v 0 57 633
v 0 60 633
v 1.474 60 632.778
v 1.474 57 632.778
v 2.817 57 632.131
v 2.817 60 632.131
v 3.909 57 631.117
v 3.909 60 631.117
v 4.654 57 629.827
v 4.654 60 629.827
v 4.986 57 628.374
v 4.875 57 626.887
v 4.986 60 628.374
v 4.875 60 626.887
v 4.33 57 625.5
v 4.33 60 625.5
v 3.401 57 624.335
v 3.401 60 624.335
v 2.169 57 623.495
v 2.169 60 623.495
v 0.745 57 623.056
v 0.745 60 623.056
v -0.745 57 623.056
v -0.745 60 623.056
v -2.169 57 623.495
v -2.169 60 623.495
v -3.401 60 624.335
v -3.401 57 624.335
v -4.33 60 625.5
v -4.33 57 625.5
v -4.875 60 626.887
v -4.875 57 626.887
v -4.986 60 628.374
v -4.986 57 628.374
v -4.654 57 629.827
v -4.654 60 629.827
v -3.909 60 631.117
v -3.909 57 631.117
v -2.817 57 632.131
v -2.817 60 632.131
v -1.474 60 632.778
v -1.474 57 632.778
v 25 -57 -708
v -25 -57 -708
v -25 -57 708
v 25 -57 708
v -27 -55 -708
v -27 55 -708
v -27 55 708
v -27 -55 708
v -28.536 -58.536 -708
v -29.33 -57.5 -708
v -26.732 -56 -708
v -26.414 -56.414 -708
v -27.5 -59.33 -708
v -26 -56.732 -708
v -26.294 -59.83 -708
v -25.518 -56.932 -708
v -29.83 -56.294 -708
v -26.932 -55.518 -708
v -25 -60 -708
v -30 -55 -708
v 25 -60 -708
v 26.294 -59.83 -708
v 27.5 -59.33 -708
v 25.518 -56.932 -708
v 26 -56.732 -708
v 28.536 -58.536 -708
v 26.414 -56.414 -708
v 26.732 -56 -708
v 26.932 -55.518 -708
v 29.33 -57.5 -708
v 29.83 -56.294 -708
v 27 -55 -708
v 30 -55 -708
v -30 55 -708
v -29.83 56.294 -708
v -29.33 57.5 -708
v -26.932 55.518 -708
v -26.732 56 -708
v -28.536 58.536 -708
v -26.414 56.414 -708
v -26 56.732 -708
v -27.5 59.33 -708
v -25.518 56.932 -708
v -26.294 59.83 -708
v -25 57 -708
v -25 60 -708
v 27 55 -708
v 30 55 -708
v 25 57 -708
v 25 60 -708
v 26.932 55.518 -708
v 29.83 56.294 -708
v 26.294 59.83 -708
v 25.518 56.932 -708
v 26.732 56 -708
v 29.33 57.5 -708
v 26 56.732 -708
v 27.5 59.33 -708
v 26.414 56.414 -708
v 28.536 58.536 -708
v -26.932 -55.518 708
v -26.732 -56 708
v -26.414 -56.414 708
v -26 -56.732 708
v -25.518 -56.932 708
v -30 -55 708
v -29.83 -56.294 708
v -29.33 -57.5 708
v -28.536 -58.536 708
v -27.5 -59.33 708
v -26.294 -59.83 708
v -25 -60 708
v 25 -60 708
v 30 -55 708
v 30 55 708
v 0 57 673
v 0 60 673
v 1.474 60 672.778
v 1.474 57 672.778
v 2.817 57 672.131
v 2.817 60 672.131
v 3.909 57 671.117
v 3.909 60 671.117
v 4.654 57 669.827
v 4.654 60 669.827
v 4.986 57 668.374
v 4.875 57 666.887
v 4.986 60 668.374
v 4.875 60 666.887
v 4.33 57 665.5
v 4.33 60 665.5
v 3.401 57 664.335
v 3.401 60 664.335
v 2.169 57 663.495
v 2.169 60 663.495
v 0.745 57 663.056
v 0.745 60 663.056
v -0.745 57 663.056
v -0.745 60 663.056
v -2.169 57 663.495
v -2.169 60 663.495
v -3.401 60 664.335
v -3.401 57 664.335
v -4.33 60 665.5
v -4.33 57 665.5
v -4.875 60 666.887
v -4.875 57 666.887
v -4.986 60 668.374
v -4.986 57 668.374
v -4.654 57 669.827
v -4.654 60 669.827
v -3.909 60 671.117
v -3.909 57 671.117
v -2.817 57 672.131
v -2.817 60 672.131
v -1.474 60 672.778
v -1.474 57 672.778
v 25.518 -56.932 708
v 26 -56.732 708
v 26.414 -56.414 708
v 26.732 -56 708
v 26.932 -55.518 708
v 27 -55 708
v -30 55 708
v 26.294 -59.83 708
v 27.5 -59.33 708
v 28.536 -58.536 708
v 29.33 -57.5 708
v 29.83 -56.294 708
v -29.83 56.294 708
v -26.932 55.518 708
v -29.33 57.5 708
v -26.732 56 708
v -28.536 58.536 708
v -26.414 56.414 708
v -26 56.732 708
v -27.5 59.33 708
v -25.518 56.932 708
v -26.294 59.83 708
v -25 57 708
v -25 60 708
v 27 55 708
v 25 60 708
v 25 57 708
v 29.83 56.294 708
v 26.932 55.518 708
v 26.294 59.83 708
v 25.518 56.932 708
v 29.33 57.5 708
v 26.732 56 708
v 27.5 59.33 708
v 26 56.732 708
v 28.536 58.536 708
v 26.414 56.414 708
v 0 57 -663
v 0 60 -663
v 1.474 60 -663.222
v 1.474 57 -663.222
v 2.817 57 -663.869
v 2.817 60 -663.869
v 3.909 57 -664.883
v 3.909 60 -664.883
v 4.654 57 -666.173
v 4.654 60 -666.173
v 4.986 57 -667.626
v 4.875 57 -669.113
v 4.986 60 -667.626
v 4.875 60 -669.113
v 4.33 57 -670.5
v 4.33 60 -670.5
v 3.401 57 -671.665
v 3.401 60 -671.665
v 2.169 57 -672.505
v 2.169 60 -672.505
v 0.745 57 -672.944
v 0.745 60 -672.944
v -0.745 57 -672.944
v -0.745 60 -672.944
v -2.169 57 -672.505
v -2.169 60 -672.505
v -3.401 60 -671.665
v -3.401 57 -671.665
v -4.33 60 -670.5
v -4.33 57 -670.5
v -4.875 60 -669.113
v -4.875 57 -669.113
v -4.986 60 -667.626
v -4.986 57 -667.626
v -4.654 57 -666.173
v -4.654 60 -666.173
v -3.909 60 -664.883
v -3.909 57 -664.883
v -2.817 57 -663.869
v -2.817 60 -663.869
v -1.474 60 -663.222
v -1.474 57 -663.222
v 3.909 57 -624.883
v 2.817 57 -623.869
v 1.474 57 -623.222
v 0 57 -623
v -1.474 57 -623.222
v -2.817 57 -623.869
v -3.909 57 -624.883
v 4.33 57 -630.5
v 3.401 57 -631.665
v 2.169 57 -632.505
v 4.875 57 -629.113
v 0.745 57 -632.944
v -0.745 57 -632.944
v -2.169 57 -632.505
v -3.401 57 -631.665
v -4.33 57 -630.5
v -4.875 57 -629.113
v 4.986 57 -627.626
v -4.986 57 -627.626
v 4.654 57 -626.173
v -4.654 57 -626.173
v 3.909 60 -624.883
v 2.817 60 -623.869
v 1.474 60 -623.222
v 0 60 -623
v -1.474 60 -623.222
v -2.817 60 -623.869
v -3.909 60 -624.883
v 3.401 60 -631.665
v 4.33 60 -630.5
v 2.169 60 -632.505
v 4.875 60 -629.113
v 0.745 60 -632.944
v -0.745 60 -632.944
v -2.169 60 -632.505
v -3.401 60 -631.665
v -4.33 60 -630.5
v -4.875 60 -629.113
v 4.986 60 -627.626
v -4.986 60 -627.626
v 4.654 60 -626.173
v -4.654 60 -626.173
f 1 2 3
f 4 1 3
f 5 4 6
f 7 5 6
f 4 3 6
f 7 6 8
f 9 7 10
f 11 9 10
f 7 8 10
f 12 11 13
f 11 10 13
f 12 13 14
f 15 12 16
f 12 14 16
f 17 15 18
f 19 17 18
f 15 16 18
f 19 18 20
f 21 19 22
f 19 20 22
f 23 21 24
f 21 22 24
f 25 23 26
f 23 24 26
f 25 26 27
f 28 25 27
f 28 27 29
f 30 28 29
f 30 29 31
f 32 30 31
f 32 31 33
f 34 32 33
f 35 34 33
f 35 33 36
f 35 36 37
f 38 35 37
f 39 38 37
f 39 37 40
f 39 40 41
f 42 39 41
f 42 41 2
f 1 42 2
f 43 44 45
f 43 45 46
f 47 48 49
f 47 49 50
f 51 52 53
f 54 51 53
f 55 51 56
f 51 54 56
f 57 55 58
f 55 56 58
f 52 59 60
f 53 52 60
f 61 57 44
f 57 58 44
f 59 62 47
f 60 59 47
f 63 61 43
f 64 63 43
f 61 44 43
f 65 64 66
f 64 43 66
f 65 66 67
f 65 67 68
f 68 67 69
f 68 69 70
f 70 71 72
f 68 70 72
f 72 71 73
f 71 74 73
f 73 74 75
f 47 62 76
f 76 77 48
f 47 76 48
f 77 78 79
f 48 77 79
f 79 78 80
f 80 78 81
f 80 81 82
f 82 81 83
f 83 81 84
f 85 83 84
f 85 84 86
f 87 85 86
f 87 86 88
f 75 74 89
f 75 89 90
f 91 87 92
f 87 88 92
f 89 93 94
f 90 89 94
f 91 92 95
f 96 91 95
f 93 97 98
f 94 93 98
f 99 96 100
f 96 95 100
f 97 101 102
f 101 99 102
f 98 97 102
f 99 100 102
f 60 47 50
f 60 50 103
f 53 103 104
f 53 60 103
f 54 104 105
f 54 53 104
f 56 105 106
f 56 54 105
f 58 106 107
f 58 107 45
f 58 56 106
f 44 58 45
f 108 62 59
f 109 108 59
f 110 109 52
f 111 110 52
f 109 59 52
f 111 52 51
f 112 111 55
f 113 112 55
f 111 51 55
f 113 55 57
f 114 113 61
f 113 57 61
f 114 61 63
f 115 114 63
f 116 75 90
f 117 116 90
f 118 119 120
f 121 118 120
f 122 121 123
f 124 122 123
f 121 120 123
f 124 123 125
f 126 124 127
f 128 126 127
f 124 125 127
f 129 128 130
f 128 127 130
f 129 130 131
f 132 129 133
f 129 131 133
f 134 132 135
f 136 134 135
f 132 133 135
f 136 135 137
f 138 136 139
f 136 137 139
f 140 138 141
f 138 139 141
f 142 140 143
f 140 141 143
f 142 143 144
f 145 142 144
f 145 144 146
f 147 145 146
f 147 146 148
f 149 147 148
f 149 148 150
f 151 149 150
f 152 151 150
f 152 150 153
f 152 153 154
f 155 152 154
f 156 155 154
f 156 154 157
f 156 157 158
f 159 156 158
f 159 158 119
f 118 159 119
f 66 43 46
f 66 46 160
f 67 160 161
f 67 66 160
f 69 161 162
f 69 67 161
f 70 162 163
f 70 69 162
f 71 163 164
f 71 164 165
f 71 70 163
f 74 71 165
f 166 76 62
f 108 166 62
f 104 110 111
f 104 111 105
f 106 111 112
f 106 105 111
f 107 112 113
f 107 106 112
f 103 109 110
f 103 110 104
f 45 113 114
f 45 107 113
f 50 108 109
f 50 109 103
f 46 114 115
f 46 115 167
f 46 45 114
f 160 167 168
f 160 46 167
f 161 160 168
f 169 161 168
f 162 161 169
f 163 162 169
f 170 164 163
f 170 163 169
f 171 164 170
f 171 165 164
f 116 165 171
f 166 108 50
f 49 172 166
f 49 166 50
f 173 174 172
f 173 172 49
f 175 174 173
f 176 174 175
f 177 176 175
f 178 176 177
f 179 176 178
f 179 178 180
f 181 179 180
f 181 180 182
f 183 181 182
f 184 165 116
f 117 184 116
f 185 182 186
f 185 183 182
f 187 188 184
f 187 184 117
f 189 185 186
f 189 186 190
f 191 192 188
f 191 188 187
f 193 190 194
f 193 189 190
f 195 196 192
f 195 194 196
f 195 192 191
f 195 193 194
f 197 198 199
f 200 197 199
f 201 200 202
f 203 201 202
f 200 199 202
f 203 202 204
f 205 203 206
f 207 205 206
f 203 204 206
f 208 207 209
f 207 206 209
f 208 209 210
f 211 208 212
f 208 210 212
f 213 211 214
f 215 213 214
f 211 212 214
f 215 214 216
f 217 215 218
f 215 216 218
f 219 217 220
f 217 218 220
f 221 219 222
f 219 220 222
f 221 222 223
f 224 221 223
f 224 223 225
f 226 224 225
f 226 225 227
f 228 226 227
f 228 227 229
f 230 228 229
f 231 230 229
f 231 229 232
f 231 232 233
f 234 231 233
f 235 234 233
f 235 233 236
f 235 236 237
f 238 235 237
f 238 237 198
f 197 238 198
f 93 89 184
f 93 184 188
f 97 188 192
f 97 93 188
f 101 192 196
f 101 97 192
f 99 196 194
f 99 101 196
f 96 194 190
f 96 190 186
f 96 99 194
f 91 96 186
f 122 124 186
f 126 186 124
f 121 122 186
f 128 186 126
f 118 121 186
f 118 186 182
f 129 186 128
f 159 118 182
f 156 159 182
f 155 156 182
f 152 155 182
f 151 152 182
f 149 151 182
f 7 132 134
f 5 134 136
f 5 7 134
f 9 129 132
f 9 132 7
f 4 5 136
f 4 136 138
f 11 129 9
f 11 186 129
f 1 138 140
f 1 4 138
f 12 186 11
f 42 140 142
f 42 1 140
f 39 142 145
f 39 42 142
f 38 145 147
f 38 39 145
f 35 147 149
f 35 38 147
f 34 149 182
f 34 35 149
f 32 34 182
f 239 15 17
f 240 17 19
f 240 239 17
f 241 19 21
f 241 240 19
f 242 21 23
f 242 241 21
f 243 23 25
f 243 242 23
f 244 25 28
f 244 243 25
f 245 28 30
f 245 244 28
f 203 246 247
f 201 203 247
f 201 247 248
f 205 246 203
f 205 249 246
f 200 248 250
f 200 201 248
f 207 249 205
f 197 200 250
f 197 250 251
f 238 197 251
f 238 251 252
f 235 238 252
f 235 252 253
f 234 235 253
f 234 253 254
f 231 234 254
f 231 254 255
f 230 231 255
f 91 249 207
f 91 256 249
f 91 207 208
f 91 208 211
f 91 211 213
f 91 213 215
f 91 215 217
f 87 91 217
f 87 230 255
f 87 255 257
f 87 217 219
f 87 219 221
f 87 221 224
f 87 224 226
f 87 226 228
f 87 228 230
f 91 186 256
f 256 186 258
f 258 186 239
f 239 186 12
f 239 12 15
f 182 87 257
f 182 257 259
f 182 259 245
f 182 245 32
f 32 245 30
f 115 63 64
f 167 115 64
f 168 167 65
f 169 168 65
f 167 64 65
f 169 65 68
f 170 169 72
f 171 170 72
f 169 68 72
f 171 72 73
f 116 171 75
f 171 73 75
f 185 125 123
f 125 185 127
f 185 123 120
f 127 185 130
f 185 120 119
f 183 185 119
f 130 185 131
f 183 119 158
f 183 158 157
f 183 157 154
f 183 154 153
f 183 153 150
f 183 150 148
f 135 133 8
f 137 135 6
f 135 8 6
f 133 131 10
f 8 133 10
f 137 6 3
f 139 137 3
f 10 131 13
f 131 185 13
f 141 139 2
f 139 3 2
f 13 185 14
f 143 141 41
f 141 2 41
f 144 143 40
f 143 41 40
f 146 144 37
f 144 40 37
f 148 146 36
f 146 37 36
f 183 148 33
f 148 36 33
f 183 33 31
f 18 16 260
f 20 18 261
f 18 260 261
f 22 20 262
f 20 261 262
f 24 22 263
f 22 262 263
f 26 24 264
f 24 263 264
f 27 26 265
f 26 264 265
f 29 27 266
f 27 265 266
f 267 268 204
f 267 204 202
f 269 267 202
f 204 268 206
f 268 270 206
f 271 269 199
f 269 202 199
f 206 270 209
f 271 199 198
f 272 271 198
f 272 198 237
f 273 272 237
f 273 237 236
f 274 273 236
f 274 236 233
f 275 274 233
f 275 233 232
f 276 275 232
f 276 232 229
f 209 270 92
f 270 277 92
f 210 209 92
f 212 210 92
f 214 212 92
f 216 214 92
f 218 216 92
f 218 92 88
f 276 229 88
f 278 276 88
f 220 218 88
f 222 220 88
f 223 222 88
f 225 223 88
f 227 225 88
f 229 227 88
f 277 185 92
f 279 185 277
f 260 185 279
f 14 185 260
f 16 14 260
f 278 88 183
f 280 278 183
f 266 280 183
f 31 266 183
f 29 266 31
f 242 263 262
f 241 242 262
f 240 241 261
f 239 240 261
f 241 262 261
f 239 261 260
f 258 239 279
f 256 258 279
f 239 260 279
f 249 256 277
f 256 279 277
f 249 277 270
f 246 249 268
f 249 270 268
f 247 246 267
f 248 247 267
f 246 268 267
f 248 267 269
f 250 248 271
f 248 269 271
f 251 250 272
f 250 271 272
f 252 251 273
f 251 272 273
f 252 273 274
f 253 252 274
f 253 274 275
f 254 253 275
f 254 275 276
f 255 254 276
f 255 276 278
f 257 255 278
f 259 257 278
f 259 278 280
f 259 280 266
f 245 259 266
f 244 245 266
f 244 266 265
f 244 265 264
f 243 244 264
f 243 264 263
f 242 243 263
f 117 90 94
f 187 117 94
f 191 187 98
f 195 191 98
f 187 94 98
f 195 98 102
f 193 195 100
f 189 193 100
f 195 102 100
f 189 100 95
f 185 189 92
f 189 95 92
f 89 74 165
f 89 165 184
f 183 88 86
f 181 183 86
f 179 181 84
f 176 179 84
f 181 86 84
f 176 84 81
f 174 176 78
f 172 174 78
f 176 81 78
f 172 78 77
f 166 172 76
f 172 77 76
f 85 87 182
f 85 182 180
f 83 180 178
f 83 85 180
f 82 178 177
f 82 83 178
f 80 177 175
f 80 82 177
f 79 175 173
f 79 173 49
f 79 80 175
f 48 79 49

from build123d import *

# Parameters (mm, degrees)
EXTRUDE_THIN1_DEPTH      = 708
EXTRUDE_THIN1_DEPTH_BACK = 708
CUT_EXTRUDE1_REACH       = 720.724
SKETCH3_R                = 5


with BuildPart() as part:
    # Sketch2 → Extrude-Thin1 (new, two sides: drawn at the far end of the back side and taken through both)
    with BuildSketch(Plane.XY.offset(-EXTRUDE_THIN1_DEPTH_BACK)):
        with BuildLine():
            Line((-25, -60), (25, -60))
            ThreePointArc((25, -60), (28.535533906, -58.535533906), (30, -55))
            Line((30, -55), (30, 55))
            ThreePointArc((30, 55), (28.535533906, 58.535533906), (25, 60))
            Line((25, 60), (-25, 60))
            ThreePointArc((-25, 60), (-28.535533906, 58.535533906), (-30, 55))
            Line((-30, 55), (-30, -55))
            ThreePointArc((-30, -55), (-28.535533906, -58.535533906), (-25, -60))
        make_face()
        with BuildLine():
            Line((-25, -57), (25, -57))
            ThreePointArc((25, -57), (26.414213562, -56.414213562), (27, -55))
            Line((27, -55), (27, 55))
            ThreePointArc((27, 55), (26.414213562, 56.414213562), (25, 57))
            Line((25, 57), (-25, 57))
            ThreePointArc((-25, 57), (-26.414213562, 56.414213562), (-27, 55))
            Line((-27, 55), (-27, -55))
            ThreePointArc((-27, -55), (-26.414213562, -56.414213562), (-25, -57))
        make_face(mode=Mode.SUBTRACT)
    extrude(amount=EXTRUDE_THIN1_DEPTH + EXTRUDE_THIN1_DEPTH_BACK)

    # Sketch3 → Cut-Extrude1 (cut, up to next)
    with BuildSketch(Plane(origin=(0, 60, 0), x_dir=(1, 0, 0), z_dir=(0, 1, 0)), mode=Mode.PRIVATE) as cut_extrude1_sk1:
        with Locations(Location((0, 668, 0), (0, 0, 270))):
            Circle(SKETCH3_R)
    cut_extrude1_tool1 = extrude(cut_extrude1_sk1.sketch, amount=-CUT_EXTRUDE1_REACH, mode=Mode.PRIVATE) & part.part
    # Sketch3 → Cut-Extrude1 (cut, up to next)
    with BuildSketch(Plane(origin=(0, 60, 0), x_dir=(1, 0, 0), z_dir=(0, 1, 0)), mode=Mode.PRIVATE) as cut_extrude1_sk2:
        with Locations(Location((0, 628, 0), (0, 0, 270))):
            Circle(SKETCH3_R)
    cut_extrude1_tool2 = extrude(cut_extrude1_sk2.sketch, amount=-CUT_EXTRUDE1_REACH, mode=Mode.PRIVATE) & part.part
    # Sketch3 → Cut-Extrude1 (cut, up to next)
    with BuildSketch(Plane(origin=(0, 60, 0), x_dir=(1, 0, 0), z_dir=(0, 1, 0)), mode=Mode.PRIVATE) as cut_extrude1_sk3:
        with Locations(Location((0, -628, 0), (0, 0, 270))):
            Circle(SKETCH3_R)
    cut_extrude1_tool3 = extrude(cut_extrude1_sk3.sketch, amount=-CUT_EXTRUDE1_REACH, mode=Mode.PRIVATE) & part.part
    # Sketch3 → Cut-Extrude1 (cut, up to next)
    with BuildSketch(Plane(origin=(0, 60, 0), x_dir=(1, 0, 0), z_dir=(0, 1, 0)), mode=Mode.PRIVATE) as cut_extrude1_sk4:
        with Locations(Location((0, -668, 0), (0, 0, 270))):
            Circle(SKETCH3_R)
    cut_extrude1_tool4 = extrude(cut_extrude1_sk4.sketch, amount=-CUT_EXTRUDE1_REACH, mode=Mode.PRIVATE) & part.part
    add(cut_extrude1_tool1.solids().sort_by_distance((0, 60, -668))[0], mode=Mode.SUBTRACT)
    add(cut_extrude1_tool2.solids().sort_by_distance((0, 60, -628))[0], mode=Mode.SUBTRACT)
    add(cut_extrude1_tool3.solids().sort_by_distance((0, 60, 628))[0], mode=Mode.SUBTRACT)
    add(cut_extrude1_tool4.solids().sort_by_distance((0, 60, 668))[0], mode=Mode.SUBTRACT)


solid = part.part
